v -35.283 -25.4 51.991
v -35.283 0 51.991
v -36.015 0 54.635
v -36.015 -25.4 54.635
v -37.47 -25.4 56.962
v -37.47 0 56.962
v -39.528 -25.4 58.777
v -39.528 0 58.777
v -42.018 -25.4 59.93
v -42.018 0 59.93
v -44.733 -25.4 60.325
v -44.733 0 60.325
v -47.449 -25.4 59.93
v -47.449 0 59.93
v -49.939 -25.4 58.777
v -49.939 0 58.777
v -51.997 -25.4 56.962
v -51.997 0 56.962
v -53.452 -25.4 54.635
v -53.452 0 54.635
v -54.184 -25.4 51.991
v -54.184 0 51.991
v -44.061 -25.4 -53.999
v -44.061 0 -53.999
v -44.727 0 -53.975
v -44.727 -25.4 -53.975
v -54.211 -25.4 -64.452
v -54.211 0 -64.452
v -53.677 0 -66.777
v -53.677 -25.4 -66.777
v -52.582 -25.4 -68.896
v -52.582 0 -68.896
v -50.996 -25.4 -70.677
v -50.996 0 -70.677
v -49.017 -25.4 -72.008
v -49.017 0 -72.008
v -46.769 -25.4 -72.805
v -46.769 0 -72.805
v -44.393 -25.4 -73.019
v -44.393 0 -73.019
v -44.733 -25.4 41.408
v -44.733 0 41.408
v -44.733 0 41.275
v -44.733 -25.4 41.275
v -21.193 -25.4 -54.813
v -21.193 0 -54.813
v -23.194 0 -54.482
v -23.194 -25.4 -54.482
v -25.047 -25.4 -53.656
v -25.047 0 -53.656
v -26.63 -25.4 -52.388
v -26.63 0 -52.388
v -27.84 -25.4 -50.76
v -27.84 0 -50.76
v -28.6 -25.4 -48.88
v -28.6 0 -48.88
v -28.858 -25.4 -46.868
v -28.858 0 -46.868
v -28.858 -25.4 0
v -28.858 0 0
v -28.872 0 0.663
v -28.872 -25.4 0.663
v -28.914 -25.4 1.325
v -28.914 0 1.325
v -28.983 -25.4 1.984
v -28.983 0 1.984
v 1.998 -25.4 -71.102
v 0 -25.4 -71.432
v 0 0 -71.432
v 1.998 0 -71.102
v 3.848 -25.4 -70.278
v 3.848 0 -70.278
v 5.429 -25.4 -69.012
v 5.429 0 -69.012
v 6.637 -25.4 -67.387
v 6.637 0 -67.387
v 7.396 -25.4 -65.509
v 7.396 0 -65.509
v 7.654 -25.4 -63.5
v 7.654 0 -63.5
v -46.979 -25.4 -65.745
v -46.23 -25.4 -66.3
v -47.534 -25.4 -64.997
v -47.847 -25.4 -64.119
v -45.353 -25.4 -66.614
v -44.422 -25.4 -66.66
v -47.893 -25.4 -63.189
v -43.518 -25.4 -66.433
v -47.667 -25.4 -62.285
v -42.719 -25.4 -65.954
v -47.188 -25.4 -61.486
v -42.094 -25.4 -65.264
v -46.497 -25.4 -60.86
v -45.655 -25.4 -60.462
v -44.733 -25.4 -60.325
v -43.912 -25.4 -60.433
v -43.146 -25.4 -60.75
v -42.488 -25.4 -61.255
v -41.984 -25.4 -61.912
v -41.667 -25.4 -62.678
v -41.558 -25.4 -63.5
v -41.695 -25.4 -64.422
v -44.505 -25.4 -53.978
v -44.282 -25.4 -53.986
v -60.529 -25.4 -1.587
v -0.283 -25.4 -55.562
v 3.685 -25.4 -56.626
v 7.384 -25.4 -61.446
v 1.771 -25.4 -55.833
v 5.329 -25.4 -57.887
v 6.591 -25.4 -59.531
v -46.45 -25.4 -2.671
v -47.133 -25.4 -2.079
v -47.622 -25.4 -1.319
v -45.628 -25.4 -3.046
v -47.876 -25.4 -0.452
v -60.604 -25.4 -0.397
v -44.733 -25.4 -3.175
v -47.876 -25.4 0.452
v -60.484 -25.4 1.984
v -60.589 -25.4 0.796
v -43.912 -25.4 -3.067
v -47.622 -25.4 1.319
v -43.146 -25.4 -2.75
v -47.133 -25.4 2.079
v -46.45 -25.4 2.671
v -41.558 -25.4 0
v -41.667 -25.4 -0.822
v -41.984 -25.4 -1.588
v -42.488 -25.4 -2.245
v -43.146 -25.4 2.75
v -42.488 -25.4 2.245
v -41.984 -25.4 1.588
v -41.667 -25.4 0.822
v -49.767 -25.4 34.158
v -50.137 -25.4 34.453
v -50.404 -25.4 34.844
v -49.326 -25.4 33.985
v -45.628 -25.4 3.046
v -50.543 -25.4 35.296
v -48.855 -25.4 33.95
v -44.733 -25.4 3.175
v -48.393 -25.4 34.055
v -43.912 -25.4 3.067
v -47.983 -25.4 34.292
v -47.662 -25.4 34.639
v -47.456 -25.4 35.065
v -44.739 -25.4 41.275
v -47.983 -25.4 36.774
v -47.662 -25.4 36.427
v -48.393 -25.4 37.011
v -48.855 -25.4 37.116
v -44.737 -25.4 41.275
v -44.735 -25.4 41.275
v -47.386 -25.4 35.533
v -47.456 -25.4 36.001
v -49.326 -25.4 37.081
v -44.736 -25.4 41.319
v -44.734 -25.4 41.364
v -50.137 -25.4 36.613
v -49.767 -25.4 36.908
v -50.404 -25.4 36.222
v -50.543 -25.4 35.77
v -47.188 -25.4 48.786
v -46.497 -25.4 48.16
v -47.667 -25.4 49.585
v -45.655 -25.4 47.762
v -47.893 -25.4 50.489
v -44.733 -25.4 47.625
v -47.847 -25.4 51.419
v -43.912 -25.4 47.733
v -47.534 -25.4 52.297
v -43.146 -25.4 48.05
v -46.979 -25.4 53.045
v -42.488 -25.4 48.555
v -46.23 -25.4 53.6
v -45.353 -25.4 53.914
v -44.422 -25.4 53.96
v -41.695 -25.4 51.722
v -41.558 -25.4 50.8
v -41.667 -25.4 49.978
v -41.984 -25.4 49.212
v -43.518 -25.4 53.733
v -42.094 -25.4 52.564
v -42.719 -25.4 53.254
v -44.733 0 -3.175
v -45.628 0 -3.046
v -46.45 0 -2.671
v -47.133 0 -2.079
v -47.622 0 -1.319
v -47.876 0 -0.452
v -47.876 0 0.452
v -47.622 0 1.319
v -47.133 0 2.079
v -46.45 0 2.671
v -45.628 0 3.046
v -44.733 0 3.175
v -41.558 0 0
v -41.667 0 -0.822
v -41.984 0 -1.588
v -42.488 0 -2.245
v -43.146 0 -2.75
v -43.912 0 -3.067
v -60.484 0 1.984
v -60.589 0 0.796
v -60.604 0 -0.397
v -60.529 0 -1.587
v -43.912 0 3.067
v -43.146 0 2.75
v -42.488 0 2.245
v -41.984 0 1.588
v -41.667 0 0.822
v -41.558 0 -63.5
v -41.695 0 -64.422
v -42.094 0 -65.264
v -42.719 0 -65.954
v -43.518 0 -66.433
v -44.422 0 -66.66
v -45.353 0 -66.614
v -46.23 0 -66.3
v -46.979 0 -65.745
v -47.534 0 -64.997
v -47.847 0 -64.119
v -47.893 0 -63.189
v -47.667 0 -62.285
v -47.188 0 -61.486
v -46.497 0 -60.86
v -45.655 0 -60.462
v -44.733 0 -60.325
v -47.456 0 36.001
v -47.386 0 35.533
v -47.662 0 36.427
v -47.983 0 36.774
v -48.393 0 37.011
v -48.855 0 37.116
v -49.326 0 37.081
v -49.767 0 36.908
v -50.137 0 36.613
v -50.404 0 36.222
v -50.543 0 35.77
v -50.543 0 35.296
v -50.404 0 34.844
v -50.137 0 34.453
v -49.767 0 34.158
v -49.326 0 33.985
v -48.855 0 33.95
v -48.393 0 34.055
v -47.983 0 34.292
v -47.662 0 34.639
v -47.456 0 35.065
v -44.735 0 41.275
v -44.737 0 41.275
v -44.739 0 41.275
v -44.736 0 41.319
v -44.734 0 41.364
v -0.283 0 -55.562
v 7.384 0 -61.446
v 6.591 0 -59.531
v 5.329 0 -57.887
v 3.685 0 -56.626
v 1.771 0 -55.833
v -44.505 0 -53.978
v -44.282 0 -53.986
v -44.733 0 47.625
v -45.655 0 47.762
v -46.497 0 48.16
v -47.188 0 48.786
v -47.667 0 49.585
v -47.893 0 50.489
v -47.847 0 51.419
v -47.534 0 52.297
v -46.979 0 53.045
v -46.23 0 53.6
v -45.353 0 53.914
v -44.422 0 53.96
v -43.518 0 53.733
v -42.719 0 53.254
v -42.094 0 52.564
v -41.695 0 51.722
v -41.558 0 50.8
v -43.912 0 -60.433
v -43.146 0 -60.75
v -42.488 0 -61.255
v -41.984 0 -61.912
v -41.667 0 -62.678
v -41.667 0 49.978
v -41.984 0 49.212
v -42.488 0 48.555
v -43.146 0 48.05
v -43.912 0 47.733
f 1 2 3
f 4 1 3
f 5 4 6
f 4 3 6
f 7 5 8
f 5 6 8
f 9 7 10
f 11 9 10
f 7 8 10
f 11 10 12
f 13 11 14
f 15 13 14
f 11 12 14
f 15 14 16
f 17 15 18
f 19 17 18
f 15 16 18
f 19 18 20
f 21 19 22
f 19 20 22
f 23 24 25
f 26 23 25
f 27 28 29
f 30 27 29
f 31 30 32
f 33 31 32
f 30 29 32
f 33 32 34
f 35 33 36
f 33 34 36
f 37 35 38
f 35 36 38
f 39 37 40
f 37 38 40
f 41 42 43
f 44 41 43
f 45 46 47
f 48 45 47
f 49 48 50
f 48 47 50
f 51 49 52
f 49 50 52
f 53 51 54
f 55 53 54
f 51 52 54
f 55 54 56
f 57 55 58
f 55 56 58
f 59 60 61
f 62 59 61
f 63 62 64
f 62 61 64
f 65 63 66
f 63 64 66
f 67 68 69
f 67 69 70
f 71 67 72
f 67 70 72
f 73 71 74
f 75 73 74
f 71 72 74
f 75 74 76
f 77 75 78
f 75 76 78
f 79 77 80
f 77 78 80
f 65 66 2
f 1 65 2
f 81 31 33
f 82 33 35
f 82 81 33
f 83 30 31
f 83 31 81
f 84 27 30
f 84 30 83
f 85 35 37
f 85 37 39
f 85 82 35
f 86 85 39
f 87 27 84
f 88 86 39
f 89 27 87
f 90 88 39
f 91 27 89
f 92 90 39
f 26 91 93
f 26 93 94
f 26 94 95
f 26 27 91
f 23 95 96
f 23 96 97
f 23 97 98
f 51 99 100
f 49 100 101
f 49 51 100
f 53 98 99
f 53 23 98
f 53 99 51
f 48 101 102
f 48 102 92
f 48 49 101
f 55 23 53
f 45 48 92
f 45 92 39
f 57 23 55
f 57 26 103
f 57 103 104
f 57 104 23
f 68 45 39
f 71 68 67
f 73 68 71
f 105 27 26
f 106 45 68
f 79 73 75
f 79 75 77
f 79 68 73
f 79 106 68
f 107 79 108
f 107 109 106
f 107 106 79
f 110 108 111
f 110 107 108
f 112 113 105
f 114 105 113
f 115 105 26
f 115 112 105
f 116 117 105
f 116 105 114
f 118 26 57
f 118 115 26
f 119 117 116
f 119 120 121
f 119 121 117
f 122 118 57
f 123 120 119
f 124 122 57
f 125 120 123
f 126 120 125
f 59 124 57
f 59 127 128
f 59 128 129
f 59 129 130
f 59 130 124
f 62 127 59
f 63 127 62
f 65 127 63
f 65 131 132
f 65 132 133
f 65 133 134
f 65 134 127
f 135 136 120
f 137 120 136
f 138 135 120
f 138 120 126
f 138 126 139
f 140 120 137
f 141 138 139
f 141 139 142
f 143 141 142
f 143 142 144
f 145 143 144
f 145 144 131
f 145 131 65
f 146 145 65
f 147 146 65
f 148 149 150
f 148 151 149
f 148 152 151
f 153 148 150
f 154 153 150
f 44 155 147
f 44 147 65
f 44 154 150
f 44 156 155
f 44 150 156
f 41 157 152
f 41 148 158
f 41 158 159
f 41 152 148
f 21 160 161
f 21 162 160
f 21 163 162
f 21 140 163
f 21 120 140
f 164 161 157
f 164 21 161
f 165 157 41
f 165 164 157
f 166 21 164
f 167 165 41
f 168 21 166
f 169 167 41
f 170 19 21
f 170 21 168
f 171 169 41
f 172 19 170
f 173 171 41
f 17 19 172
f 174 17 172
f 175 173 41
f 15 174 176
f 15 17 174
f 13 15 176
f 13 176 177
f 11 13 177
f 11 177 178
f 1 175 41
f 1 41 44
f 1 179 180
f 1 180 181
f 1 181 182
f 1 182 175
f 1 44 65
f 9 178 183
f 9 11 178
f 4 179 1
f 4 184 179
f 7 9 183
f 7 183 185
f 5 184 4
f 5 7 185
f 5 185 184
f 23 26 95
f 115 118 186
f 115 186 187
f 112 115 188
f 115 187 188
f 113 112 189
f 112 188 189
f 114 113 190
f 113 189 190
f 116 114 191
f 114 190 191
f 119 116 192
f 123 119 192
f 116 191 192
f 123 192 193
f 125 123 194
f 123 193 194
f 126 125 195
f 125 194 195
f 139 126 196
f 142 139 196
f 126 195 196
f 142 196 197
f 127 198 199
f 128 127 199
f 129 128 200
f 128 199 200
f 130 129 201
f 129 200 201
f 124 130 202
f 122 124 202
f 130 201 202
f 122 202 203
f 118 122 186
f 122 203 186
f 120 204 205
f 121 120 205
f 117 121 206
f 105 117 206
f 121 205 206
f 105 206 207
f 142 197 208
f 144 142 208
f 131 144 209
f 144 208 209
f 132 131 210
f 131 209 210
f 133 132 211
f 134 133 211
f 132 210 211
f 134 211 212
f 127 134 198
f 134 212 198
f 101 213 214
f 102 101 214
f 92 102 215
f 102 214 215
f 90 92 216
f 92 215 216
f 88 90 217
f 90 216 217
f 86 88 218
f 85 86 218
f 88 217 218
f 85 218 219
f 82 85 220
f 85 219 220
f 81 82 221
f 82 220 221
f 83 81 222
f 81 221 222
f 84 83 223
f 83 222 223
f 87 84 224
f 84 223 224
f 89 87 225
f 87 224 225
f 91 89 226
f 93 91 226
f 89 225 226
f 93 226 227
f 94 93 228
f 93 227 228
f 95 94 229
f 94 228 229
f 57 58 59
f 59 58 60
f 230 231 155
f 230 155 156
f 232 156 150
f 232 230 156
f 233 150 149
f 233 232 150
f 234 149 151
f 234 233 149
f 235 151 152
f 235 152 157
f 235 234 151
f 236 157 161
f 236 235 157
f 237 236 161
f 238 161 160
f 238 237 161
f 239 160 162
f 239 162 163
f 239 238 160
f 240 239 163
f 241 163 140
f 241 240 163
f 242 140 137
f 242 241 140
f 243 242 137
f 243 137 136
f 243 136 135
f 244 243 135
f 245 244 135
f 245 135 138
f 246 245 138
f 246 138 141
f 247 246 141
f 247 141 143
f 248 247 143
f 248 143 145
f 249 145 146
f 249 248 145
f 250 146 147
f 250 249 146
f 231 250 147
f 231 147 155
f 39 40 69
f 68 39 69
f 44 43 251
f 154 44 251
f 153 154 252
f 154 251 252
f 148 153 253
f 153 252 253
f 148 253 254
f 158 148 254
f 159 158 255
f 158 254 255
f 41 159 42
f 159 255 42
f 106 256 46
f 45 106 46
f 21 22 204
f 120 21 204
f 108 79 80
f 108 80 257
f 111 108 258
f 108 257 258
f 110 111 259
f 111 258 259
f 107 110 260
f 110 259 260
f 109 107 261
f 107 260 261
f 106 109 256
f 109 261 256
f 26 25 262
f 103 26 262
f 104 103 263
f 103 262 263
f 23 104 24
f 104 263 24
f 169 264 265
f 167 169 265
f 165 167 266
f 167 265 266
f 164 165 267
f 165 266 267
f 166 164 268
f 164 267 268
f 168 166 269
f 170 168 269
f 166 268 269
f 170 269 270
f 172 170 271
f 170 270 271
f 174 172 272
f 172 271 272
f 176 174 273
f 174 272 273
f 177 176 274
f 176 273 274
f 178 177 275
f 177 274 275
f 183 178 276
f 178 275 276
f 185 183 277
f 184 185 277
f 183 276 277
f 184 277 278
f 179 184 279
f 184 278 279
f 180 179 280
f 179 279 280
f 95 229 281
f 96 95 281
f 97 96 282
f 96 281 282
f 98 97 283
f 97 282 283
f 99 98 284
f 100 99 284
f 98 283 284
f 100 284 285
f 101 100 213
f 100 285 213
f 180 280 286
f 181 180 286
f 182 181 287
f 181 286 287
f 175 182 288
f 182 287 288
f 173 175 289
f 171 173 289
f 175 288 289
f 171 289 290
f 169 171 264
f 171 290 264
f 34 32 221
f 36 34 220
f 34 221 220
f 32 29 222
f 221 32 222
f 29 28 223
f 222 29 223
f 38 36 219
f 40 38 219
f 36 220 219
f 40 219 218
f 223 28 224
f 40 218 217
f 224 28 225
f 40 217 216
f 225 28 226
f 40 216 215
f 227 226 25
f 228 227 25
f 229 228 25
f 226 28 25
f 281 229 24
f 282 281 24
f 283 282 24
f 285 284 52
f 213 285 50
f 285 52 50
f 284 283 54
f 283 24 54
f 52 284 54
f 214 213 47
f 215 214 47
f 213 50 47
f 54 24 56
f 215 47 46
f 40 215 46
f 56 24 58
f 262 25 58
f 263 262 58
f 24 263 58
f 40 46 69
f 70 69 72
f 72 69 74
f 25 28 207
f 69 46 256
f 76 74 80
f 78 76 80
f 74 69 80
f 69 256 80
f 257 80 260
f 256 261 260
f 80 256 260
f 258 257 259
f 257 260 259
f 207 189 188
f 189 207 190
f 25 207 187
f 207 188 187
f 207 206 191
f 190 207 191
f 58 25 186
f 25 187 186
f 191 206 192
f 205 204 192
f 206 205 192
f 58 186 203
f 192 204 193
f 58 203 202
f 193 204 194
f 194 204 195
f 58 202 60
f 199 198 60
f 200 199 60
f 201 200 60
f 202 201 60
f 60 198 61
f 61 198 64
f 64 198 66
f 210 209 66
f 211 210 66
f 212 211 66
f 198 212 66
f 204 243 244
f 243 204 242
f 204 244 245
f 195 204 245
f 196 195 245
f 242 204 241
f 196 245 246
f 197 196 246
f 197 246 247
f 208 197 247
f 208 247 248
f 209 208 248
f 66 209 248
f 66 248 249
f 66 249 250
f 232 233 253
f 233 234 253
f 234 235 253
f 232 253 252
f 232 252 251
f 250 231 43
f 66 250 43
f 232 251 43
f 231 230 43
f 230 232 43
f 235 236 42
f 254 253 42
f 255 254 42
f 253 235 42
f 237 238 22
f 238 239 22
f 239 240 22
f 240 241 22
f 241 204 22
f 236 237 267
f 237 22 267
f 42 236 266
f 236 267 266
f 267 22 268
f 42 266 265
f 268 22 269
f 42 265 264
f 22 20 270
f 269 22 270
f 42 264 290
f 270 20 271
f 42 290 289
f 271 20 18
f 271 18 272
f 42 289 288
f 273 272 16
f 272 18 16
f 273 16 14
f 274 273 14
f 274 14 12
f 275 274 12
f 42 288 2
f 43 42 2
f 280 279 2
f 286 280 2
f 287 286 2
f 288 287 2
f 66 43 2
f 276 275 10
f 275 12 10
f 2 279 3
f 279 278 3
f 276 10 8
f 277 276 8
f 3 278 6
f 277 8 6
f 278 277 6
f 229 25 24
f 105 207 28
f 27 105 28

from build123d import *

# Parameters (mm, degrees)
F0_R     = 1.5875
F1_DEPTH = 25.4


with BuildPart() as f1:
    # F0 (on Front) → F1 (new body)
    with BuildSketch(Plane.XZ):
        with BuildLine():
            ThreePointArc((-44.7390819472, 41.2750016461), (-44.7348827118, 41.341553676), (-44.7334821429, 41.4082233443))
            Line((-44.7334821429, 41.4082233443), (-44.7334821429, 41.275))
            ThreePointArc((-44.7334821429, 41.275), (-37.9982900521, 44.0648079092), (-35.2084821429, 50.8))
            ThreePointArc((-35.2084821429, 50.8), (-35.2271772486, 51.396483242), (-35.2831891786, 51.990625))
            ThreePointArc((-35.2831891786, 51.990625), (-44.7334821429, 60.325), (-54.1837751071, 51.990625))
            ThreePointArc((-54.1837751071, 51.990625), (-51.8790837955, 44.5019048894), (-44.7390819472, 41.2750016461))
        make_face()
        with BuildLine():
            ThreePointArc((-41.5584821429, 50.8), (-42.4884181126, 48.5549359697), (-44.7334821429, 47.625))
            ThreePointArc((-44.7334821429, 47.625), (-46.9785461731, 53.0450640303), (-41.5584821429, 50.8))
        make_face(mode=Mode.SUBTRACT)
        with BuildLine():
            ThreePointArc((-35.2084821429, 50.8), (-37.9982900521, 44.0648079092), (-44.7334821429, 41.275))
            Line((-44.7334821429, 41.275), (-44.7334821429, 15.875))
            ThreePointArc((-44.7334821429, 15.875), (-34.2331566271, 11.90625), (-28.9829938692, 1.984375))
            Line((-28.9829938692, 1.984375), (-35.2831891786, 51.990625))
            ThreePointArc((-35.2831891786, 51.990625), (-35.2271772486, 51.396483242), (-35.2084821429, 50.8))
        make_face()
        with BuildLine():
            Line((-44.7334821429, 15.875), (-44.7334821429, 41.275))
            ThreePointArc((-44.7334821429, 41.275), (-44.7362820451, 41.2750004115), (-44.7390819472, 41.2750016461))
            ThreePointArc((-44.7390819472, 41.2750016461), (-51.8790837955, 44.5019048894), (-54.1837751071, 51.990625))
            Line((-54.1837751071, 51.990625), (-60.4839704165, 1.984375))
            ThreePointArc((-60.4839704165, 1.984375), (-55.2338076586, 11.90625), (-44.7334821429, 15.875))
        make_face()
        with Locations((-48.9732250571, 35.5329811573)):
            Circle(F0_R, mode=Mode.SUBTRACT)
        with BuildLine():
            ThreePointArc((-28.9829938692, 1.984375), (-34.2331566271, 11.90625), (-44.7334821429, 15.875))
            Line((-44.7334821429, 15.875), (-44.7334821429, 3.175))
            ThreePointArc((-44.7334821429, 3.175), (-42.4884181126, 2.2450640303), (-41.5584821429, 0))
            ThreePointArc((-41.5584821429, 0), (-42.4884181126, -2.2450640303), (-44.7334821429, -3.175))
            Line((-44.7334821429, -3.175), (-44.7334821429, -15.875))
            ThreePointArc((-44.7334821429, -15.875), (-33.5081619915, -11.2253201513), (-28.8584821429, 0))
            ThreePointArc((-28.8584821429, 0), (-28.8896406525, 0.9941387366), (-28.9829938692, 1.984375))
        make_face()
        with BuildLine():
            Line((-44.7334821429, 3.175), (-44.7334821429, 15.875))
            ThreePointArc((-44.7334821429, 15.875), (-55.2338076586, 11.90625), (-60.4839704165, 1.984375))
            ThreePointArc((-60.4839704165, 1.984375), (-60.6072259583, 0.1997054867), (-60.5289077069, -1.5875))
            ThreePointArc((-60.5289077069, -1.5875), (-55.3827558857, -11.7732150983), (-44.7334821429, -15.875))
            Line((-44.7334821429, -15.875), (-44.7334821429, -3.175))
            ThreePointArc((-44.7334821429, -3.175), (-47.9084821429, 0), (-44.7334821429, 3.175))
        make_face()
        with BuildLine():
            Line((-28.8584821429, -46.8677527116), (-28.8584821429, 0))
            ThreePointArc((-28.8584821429, 0), (-33.5081619915, -11.2253201513), (-44.7334821429, -15.875))
            Line((-44.7334821429, -15.875), (-44.7334821429, -53.975))
            ThreePointArc((-44.7334821429, -53.975), (-44.7300940156, -53.9750006026), (-44.7267058887, -53.9750024104))
            ThreePointArc((-44.7267058887, -53.9750024104), (-44.3934690624, -53.9810706429), (-44.060648545, -53.9987937634))
            ThreePointArc((-44.060648545, -53.9987937634), (-37.7644662504, -57.0070467051), (-35.2084821429, -63.5))
            Line((-35.2084821429, -63.5), (-8.2209821429, -63.5))
            ThreePointArc((-8.2209821429, -63.5), (-5.8961422185, -57.8873399243), (-0.2834821429, -55.5625))
            Line((-0.2834821429, -55.5625), (-21.1931293796, -54.8128481856))
            ThreePointArc((-21.1931293796, -54.8128481856), (-26.6297449166, -52.3877657341), (-28.8584821429, -46.8677527116))
        make_face()
        with BuildLine():
            ThreePointArc((-44.7334821429, -15.875), (-55.3827558857, -11.7732150983), (-60.5289077069, -1.5875))
            Line((-60.5289077069, -1.5875), (-54.2107374813, -64.4525))
            ThreePointArc((-54.2107374813, -64.4525), (-51.7974112018, -57.1104357543), (-44.7334821429, -53.975))
            Line((-44.7334821429, -53.975), (-44.7334821429, -15.875))
        make_face()
        with BuildLine():
            ThreePointArc((-44.7334821429, -53.975), (-51.7974112018, -57.1104357543), (-54.2107374813, -64.4525))
            ThreePointArc((-54.2107374813, -64.4525), (-50.9958655245, -70.6769199091), (-44.3933035714, -73.0189234444))
            ThreePointArc((-44.3933035714, -73.0189234444), (-37.8790738572, -70.1138273378), (-35.2084821429, -63.5))
            Line((-35.2084821429, -63.5), (-41.5584821429, -63.5))
            ThreePointArc((-41.5584821429, -63.5), (-46.9785461731, -65.7450640303), (-44.7334821429, -60.325))
            Line((-44.7334821429, -60.325), (-44.7334821429, -53.975))
        make_face()
        with BuildLine():
            ThreePointArc((-35.2084821429, -63.5), (-37.8790738572, -70.1138273378), (-44.3933035714, -73.0189234444))
            Line((-44.3933035714, -73.0189234444), (0, -71.4324362036))
            ThreePointArc((0, -71.4324362036), (-5.7950049243, -69.2120069047), (-8.2209821429, -63.5))
            Line((-8.2209821429, -63.5), (-35.2084821429, -63.5))
        make_face()
        with BuildLine():
            ThreePointArc((7.6540178571, -63.5), (5.3291779328, -57.8873399243), (-0.2834821429, -55.5625))
            ThreePointArc((-0.2834821429, -55.5625), (-5.8961422185, -57.8873399243), (-8.2209821429, -63.5))
            ThreePointArc((-8.2209821429, -63.5), (-5.7950049243, -69.2120069047), (0, -71.4324362036))
            ThreePointArc((0, -71.4324362036), (5.4285247619, -69.0115227815), (7.6540178571, -63.5))
        make_face()
        with BuildLine():
            ThreePointArc((-44.7267058887, -53.9750024104), (-44.7300940156, -53.9750006026), (-44.7334821429, -53.975))
            Line((-44.7334821429, -53.975), (-44.7334821429, -60.325))
            ThreePointArc((-44.7334821429, -60.325), (-42.4884181126, -61.2549359697), (-41.5584821429, -63.5))
            Line((-41.5584821429, -63.5), (-35.2084821429, -63.5))
            ThreePointArc((-35.2084821429, -63.5), (-37.7644662504, -57.0070467051), (-44.060648545, -53.9987937634))
            Line((-44.060648545, -53.9987937634), (-44.7267058887, -53.9750024104))
        make_face()
    extrude(amount=F1_DEPTH)


solid = f1.part
